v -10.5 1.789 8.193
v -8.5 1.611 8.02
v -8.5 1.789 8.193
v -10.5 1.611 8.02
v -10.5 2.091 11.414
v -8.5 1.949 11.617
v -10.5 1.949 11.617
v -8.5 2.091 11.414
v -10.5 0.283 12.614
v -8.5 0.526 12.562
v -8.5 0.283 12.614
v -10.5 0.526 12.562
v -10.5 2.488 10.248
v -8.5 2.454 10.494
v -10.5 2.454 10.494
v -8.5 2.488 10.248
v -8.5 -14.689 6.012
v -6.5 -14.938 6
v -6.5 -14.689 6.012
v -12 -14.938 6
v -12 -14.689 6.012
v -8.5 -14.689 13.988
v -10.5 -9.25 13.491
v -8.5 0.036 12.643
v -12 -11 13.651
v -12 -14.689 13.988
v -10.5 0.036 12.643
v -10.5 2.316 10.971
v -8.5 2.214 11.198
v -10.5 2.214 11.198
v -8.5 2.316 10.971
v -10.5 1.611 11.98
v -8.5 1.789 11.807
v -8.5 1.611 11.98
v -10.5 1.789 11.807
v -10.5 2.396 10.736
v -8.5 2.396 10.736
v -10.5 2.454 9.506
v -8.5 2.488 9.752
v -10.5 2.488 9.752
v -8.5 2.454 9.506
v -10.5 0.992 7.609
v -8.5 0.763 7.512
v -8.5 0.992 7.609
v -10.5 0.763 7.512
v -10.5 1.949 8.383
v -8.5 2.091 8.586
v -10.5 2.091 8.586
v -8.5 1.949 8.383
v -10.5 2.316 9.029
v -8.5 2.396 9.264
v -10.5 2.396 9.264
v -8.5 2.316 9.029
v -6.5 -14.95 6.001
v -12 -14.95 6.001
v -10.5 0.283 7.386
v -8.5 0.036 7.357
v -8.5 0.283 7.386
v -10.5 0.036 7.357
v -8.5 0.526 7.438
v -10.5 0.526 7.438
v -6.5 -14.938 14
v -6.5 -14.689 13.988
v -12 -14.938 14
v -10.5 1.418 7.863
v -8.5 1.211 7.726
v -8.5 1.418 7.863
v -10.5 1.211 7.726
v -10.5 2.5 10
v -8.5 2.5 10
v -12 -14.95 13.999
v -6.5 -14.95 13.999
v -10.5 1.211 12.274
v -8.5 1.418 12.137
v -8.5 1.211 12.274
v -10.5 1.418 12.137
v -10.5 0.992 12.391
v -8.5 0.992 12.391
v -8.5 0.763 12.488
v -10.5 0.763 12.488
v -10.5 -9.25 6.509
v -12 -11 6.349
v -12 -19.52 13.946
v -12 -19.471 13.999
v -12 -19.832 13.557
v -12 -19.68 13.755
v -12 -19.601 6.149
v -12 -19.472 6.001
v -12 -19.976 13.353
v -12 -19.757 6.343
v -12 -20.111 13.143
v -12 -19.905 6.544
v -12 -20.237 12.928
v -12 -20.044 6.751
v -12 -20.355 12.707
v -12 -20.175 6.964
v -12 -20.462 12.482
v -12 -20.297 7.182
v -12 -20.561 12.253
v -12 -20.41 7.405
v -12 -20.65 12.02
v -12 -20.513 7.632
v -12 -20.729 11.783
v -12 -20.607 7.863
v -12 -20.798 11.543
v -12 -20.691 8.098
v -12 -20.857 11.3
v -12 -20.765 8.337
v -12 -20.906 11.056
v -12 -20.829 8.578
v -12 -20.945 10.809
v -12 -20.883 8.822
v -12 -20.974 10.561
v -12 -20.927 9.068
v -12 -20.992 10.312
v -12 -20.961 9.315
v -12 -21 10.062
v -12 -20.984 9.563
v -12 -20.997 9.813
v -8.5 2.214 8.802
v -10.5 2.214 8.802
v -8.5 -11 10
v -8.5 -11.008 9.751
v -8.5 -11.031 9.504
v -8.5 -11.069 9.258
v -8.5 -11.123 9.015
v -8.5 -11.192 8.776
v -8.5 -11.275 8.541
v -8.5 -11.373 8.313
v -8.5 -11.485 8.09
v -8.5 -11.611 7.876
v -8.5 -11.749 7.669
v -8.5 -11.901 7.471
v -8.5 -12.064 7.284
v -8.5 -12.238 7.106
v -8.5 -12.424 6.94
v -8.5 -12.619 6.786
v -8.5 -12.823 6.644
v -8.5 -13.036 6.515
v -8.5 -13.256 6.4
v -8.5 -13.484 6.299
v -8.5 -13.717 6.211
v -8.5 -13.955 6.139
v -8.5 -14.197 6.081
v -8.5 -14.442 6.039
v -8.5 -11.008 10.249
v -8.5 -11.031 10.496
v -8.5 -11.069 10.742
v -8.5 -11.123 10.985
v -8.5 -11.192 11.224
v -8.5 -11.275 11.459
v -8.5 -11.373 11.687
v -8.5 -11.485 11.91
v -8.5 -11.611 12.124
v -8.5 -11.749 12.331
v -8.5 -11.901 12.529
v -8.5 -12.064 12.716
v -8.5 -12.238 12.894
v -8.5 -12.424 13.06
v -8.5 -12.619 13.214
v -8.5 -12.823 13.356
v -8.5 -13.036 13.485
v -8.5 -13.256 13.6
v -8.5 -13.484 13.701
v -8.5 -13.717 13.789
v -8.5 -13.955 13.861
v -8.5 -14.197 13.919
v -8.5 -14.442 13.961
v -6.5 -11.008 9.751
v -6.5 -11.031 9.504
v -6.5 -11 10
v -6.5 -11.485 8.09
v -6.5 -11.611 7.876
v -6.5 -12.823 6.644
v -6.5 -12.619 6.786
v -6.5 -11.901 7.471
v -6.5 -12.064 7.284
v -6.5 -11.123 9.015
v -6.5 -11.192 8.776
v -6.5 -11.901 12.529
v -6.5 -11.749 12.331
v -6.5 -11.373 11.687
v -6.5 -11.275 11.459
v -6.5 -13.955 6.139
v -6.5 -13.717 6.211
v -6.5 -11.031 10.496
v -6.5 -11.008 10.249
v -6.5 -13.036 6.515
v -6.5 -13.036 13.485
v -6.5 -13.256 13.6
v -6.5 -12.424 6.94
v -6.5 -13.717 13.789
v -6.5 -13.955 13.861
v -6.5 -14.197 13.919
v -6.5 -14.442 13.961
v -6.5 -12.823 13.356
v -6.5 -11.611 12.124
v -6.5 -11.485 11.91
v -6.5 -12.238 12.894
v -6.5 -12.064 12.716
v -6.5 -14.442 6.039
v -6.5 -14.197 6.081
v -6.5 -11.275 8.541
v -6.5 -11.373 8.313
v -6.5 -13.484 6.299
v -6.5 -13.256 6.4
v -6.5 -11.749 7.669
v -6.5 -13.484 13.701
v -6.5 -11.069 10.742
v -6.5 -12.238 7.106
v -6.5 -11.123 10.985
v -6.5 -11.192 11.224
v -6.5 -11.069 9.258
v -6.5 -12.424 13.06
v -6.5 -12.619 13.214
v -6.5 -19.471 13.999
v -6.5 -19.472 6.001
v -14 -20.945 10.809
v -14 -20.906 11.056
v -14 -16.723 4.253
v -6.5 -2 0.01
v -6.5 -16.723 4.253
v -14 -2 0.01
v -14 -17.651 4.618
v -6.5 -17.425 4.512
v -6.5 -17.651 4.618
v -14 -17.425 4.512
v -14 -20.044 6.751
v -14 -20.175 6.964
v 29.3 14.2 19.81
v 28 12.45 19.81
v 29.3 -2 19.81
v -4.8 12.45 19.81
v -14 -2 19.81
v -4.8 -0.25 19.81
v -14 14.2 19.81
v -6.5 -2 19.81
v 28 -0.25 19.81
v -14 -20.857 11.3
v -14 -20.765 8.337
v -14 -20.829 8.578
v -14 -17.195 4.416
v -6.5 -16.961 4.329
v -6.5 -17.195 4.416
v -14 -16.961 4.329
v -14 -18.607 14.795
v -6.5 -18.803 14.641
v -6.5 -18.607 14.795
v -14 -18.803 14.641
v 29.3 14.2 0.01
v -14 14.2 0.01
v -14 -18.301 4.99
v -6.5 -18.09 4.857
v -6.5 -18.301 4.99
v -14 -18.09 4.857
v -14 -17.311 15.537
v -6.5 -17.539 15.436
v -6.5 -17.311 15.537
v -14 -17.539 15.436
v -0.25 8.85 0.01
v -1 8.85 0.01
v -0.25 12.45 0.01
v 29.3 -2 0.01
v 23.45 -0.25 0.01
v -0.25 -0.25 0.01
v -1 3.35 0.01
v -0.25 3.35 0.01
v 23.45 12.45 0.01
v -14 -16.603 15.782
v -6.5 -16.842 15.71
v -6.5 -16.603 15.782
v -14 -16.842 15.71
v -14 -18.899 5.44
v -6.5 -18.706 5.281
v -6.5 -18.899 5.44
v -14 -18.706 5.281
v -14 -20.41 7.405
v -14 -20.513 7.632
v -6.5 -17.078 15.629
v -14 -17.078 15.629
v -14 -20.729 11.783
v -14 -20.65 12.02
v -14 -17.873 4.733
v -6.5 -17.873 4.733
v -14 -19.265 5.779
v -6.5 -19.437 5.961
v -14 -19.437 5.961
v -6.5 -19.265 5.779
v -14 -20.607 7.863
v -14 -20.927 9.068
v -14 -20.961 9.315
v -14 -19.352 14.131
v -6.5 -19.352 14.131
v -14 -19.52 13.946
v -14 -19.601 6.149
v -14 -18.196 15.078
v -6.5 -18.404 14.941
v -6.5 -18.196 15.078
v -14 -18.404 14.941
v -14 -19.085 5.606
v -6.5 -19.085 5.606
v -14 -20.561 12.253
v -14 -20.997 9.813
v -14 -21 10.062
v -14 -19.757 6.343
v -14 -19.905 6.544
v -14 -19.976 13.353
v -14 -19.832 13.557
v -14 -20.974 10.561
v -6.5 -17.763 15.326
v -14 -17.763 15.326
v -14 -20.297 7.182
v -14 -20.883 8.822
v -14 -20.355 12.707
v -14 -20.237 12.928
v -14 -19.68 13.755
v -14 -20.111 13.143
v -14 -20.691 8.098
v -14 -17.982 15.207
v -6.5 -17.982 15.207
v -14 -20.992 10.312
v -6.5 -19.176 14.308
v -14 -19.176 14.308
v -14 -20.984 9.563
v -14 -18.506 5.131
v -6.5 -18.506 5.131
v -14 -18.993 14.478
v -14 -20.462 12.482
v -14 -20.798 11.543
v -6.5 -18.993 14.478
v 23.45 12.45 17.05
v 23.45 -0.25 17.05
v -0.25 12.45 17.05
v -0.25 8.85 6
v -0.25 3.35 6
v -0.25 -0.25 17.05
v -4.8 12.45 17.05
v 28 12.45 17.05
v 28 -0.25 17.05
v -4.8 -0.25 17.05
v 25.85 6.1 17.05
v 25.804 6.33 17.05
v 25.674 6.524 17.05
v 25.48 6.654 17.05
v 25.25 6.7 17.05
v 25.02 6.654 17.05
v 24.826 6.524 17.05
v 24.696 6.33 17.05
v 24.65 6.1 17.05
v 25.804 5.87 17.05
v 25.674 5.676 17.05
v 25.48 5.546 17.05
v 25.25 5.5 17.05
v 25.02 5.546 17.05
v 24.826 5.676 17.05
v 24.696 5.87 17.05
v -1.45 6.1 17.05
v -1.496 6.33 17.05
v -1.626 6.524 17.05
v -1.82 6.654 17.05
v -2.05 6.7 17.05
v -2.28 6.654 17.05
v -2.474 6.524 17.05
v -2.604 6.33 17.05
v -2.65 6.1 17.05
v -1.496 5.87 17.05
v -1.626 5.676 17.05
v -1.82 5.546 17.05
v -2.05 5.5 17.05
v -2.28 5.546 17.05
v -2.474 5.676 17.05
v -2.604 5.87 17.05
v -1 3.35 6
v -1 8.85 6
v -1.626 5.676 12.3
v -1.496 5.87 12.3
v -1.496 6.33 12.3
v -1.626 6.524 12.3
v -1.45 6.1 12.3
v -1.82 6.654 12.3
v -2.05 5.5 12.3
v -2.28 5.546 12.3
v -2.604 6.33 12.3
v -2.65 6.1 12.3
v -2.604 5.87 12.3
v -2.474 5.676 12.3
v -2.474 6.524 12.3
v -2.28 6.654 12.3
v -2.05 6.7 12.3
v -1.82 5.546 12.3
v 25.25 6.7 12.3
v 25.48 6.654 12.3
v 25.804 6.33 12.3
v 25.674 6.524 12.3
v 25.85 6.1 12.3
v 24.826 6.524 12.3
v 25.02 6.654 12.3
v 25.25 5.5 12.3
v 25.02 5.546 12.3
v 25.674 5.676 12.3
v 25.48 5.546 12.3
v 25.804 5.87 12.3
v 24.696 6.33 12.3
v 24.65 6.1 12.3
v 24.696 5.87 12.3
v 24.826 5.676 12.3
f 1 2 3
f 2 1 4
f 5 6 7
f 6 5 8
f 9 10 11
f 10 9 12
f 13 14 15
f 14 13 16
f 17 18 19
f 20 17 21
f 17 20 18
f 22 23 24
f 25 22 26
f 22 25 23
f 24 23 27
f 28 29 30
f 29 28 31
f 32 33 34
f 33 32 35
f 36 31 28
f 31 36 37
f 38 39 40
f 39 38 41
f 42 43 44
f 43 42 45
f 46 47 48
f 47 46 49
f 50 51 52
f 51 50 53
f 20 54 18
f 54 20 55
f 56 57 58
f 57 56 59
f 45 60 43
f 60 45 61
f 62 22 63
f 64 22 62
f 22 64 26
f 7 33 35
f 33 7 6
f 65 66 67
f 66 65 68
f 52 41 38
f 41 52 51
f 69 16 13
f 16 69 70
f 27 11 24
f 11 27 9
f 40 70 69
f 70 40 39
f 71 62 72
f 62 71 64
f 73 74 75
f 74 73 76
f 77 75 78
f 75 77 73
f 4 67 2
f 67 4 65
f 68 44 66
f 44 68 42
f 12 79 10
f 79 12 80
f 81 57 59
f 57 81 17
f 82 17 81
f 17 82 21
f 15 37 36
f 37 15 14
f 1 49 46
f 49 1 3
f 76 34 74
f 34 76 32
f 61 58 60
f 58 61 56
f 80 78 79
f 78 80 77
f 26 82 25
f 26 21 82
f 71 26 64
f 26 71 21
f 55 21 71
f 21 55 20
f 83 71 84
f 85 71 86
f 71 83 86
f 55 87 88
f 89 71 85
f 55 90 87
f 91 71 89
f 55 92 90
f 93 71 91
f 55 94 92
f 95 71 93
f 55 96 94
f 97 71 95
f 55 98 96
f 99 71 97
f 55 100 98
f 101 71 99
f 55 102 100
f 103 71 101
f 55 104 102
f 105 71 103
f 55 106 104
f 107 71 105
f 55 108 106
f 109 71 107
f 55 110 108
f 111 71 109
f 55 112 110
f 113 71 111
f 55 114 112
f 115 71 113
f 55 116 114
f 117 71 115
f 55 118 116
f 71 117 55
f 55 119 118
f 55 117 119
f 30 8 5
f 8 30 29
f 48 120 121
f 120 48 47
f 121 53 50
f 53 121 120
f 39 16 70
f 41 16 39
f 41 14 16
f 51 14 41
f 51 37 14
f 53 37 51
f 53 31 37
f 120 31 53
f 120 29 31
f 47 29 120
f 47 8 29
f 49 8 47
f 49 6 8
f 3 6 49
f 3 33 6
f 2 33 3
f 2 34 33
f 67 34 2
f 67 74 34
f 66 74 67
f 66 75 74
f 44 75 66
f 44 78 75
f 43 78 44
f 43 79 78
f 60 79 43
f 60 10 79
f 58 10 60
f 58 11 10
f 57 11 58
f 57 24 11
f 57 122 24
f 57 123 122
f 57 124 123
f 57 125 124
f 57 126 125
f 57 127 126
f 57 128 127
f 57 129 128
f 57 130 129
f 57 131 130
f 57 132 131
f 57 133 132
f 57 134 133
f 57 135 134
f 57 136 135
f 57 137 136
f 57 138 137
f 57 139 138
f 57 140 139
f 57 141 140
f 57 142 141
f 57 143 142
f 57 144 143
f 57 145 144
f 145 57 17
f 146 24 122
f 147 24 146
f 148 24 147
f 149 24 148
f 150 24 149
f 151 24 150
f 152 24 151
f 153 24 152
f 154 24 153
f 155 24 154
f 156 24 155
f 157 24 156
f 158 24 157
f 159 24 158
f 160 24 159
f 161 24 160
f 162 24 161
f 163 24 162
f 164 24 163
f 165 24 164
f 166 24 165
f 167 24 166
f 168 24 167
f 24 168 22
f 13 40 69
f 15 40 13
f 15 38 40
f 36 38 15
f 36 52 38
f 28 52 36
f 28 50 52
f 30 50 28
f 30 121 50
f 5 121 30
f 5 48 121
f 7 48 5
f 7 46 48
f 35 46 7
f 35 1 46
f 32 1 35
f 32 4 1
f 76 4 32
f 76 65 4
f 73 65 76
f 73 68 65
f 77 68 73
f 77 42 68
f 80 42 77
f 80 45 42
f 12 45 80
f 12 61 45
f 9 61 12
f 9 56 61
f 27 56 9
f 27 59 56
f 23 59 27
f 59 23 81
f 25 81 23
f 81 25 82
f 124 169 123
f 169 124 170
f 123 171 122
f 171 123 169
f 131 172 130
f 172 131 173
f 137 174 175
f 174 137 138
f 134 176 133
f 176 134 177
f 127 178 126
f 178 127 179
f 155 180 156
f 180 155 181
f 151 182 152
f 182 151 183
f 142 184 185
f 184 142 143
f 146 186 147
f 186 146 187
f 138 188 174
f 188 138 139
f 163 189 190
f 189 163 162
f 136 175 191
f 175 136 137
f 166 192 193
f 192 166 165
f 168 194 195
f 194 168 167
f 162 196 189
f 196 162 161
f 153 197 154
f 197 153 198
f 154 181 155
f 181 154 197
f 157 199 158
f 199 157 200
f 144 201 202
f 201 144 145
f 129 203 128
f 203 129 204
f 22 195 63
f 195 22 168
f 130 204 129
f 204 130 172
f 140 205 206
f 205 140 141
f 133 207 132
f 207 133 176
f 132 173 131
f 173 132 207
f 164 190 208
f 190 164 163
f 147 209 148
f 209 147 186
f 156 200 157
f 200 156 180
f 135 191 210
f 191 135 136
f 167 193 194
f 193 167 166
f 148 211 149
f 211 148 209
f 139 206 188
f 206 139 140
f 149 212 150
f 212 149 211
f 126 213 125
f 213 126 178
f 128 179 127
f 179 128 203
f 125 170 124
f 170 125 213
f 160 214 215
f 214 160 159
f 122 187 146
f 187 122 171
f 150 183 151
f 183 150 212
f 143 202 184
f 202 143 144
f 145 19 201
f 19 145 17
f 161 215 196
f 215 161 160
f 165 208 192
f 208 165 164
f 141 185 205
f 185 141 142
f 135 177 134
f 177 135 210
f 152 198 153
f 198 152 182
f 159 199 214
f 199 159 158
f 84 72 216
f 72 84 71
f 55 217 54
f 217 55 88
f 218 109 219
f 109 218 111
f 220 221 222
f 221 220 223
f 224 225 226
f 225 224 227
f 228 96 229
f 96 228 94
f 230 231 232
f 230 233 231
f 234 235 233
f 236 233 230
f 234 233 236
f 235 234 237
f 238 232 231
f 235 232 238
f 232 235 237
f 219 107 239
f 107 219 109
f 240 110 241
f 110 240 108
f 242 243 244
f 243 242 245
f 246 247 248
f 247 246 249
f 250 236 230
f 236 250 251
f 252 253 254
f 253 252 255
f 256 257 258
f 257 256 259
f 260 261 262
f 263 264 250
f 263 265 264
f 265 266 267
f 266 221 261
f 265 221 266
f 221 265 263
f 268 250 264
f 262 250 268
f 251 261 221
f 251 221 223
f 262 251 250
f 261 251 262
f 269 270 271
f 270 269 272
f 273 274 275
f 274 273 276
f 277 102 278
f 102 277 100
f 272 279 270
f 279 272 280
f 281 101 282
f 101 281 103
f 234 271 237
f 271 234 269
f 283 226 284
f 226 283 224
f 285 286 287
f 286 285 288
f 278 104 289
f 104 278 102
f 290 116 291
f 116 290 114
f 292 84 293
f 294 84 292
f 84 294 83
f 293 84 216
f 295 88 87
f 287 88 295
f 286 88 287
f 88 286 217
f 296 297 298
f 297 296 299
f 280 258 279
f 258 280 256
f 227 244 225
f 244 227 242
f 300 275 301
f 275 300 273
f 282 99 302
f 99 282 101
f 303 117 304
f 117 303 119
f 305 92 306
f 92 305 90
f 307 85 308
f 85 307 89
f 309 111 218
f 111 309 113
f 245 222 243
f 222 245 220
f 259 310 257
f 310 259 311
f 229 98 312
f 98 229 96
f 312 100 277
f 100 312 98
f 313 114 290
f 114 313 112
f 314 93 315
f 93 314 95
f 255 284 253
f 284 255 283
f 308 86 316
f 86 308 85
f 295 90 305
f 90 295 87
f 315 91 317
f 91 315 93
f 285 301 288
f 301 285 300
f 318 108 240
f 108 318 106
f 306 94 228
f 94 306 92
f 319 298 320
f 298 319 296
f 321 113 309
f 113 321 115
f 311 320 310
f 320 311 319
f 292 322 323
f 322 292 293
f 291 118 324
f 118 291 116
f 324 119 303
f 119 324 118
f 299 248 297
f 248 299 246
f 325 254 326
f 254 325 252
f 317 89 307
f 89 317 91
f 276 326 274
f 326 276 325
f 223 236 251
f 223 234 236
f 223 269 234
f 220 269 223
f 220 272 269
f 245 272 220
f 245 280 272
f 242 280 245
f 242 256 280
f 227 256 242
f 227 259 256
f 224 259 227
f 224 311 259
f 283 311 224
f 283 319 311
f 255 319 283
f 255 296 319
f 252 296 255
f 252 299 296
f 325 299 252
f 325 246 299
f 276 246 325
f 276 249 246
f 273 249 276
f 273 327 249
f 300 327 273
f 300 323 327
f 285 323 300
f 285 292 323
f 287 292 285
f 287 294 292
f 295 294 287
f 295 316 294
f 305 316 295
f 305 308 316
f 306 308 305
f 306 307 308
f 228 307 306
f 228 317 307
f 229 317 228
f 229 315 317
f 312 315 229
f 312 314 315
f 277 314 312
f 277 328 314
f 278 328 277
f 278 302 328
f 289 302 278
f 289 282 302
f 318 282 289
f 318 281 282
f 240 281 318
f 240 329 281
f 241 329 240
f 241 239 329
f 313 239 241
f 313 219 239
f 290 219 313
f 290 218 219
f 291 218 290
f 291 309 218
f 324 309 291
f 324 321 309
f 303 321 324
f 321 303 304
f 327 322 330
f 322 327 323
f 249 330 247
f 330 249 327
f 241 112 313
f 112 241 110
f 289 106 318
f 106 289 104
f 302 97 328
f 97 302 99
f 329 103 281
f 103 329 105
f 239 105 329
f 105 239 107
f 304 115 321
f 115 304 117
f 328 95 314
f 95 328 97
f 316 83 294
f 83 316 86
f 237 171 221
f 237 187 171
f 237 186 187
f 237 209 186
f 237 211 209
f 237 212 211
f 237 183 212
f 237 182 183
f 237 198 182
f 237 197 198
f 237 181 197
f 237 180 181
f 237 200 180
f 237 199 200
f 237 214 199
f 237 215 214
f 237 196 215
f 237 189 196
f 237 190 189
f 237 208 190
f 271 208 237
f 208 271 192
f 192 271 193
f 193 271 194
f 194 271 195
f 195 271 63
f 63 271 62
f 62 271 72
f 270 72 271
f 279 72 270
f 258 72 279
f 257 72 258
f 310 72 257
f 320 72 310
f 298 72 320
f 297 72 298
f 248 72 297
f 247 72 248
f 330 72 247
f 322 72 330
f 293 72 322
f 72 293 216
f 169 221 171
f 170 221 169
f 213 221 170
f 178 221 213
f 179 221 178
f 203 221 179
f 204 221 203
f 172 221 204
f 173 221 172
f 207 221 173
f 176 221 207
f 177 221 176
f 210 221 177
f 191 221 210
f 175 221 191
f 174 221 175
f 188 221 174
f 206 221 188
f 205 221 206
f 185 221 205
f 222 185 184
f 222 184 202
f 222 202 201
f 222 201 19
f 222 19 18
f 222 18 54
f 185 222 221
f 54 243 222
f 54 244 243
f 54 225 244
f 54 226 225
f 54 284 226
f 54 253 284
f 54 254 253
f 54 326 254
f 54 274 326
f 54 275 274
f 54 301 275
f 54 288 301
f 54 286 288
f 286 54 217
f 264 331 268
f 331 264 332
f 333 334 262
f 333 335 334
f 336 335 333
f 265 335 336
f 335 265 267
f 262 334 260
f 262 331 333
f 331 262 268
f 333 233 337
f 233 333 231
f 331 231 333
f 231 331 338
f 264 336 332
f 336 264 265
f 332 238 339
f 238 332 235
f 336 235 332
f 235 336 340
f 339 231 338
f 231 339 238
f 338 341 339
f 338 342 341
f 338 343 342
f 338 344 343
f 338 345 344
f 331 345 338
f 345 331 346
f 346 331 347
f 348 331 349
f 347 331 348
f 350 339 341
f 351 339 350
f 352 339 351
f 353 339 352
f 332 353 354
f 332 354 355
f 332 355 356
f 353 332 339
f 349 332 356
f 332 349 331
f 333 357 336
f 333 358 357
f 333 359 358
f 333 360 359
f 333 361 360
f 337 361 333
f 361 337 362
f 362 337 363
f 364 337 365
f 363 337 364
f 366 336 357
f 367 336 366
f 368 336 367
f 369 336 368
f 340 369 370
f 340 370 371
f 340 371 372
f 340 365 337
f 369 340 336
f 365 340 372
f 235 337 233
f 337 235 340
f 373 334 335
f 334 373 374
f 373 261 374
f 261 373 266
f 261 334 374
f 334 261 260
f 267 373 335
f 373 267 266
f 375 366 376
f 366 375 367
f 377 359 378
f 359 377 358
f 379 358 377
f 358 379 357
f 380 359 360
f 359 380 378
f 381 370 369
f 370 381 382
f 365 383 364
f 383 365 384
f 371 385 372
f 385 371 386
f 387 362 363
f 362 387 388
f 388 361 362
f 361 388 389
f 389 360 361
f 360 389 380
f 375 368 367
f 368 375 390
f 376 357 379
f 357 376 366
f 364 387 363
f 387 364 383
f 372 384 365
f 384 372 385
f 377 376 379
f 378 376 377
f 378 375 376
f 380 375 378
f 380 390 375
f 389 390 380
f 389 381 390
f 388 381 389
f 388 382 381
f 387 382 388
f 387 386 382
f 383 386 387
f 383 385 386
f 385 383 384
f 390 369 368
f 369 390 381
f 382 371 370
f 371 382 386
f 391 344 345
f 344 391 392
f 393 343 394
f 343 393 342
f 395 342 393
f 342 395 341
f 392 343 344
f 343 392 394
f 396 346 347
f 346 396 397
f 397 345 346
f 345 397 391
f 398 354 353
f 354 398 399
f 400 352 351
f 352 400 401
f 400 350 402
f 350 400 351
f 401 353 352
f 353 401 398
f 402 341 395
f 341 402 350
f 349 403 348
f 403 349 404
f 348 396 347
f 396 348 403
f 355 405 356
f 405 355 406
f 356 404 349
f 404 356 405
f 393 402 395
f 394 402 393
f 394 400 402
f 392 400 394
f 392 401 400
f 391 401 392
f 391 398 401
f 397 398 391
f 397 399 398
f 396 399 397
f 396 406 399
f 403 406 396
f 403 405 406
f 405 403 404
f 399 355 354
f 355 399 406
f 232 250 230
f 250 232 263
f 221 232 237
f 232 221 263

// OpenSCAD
$fs=0.75;
$fa=3;

$fs=0.25;
$fa=2;

module servo_horn() {
	tol = 0.5;
	r1 = (7.5+tol)/2;
	r2 = (4.8+tol)/2;


	intersection() {
		linear_extrude(3.5) hull() {
			circle(r1);
			translate([21.5-r1-r2, 0]) circle(r2);
		}
		rotate([90,0,0])
		linear_extrude(100, center=true)
		polygon([
			[-99, 3.5],
			[r1, 3.5],
			[5.75, 2],
			[99, 2],
			[99, 0],
			[-99, 0],
		]);
	}
	translate([0,0,-2-tol])
	cylinder(5.5, r1,r1);
}

module servo_horn_slidein() {
	servo_horn();
	
	hull() {
		intersection() {
			servo_horn();
			cube([0.1, 99, 99], center=true);
		}
		
		translate([-99, 0, 0])
		servo_horn();
	}
}


module servo() {
	tol = 0.5;
	
	translate([-tol/2, -tol/2, -tol/2])
		cube([23.2+tol, 12.2+tol, 24.2+tol]);
	
	translate([-tol/2 - (32.3-23.2)/2,-tol/2, 17.3 - tol/2])
		cube([32.3 +tol, 12.2 +tol, 2.6 + tol]);
	
	translate([12.2/2, 12.2/2, 24.2])
		cylinder(4.2 + tol/2, d=12.2+tol);

	translate([12.2/2, 12.2/2, 24.2])
		cylinder(7.7 + tol/2, d=5+tol);

	translate([12.2/2 + 8.8 - 5/2, 12.2/2, 24.2])
		cylinder(4.2 + tol/2, d=5+tol);
	
	translate([-1, 12.2/2 - 5.5/2, 0])
		cube([1+tol, 5.5, 6]);
}

module servo_slidein() {
	servo();
	
	translate([23.2/2-27.3/2, 12.2/2, 17.3 - 5])
		cylinder(5+0.1, d=1.2);

	translate([23.2/2+27.3/2, 12.2/2, 17.3 - 5])
		cylinder(5+0.1, d=1.2);
}

//!servo_slidein();

module servo_at_horn() {
	translate([-12.2/2, -12.2/2,-31.5]) servo();
}

//!servo_horn();


difference() {
	hull() {
		translate([-8.5 - 5.5, -15, 10])
			rotate([0,90,0]) cylinder(5.5 + 2, d=12);
//		translate([-8.5 - 5.5, 8, 10])
//			rotate([0,90,0]) cylinder(5.5 + 2, d=12);
	translate([-8.5-5.5, -2, 0.01])
		cube([5.5+2, 12.2+2+2, 17.3+2.5]);

	}
	translate([-8.5, -15, 10])
		rotate([-90,0,90]) servo_horn_slidein();
}

difference() {
	translate([-5 - 2, -2, 0.01])
		cube([32.3+2+2, 12.2+2+2, 17.3+2.5]);
	servo_slidein();
}

/*color("blue", 0.2) servo();
translate([-8.5, -15, 10]) rotate([-90,0,90]) {
	color("white", 0.4) servo_horn();
	color("blue", 0.2) rotate([0,0,180-45]) servo_at_horn();
}*/
	
